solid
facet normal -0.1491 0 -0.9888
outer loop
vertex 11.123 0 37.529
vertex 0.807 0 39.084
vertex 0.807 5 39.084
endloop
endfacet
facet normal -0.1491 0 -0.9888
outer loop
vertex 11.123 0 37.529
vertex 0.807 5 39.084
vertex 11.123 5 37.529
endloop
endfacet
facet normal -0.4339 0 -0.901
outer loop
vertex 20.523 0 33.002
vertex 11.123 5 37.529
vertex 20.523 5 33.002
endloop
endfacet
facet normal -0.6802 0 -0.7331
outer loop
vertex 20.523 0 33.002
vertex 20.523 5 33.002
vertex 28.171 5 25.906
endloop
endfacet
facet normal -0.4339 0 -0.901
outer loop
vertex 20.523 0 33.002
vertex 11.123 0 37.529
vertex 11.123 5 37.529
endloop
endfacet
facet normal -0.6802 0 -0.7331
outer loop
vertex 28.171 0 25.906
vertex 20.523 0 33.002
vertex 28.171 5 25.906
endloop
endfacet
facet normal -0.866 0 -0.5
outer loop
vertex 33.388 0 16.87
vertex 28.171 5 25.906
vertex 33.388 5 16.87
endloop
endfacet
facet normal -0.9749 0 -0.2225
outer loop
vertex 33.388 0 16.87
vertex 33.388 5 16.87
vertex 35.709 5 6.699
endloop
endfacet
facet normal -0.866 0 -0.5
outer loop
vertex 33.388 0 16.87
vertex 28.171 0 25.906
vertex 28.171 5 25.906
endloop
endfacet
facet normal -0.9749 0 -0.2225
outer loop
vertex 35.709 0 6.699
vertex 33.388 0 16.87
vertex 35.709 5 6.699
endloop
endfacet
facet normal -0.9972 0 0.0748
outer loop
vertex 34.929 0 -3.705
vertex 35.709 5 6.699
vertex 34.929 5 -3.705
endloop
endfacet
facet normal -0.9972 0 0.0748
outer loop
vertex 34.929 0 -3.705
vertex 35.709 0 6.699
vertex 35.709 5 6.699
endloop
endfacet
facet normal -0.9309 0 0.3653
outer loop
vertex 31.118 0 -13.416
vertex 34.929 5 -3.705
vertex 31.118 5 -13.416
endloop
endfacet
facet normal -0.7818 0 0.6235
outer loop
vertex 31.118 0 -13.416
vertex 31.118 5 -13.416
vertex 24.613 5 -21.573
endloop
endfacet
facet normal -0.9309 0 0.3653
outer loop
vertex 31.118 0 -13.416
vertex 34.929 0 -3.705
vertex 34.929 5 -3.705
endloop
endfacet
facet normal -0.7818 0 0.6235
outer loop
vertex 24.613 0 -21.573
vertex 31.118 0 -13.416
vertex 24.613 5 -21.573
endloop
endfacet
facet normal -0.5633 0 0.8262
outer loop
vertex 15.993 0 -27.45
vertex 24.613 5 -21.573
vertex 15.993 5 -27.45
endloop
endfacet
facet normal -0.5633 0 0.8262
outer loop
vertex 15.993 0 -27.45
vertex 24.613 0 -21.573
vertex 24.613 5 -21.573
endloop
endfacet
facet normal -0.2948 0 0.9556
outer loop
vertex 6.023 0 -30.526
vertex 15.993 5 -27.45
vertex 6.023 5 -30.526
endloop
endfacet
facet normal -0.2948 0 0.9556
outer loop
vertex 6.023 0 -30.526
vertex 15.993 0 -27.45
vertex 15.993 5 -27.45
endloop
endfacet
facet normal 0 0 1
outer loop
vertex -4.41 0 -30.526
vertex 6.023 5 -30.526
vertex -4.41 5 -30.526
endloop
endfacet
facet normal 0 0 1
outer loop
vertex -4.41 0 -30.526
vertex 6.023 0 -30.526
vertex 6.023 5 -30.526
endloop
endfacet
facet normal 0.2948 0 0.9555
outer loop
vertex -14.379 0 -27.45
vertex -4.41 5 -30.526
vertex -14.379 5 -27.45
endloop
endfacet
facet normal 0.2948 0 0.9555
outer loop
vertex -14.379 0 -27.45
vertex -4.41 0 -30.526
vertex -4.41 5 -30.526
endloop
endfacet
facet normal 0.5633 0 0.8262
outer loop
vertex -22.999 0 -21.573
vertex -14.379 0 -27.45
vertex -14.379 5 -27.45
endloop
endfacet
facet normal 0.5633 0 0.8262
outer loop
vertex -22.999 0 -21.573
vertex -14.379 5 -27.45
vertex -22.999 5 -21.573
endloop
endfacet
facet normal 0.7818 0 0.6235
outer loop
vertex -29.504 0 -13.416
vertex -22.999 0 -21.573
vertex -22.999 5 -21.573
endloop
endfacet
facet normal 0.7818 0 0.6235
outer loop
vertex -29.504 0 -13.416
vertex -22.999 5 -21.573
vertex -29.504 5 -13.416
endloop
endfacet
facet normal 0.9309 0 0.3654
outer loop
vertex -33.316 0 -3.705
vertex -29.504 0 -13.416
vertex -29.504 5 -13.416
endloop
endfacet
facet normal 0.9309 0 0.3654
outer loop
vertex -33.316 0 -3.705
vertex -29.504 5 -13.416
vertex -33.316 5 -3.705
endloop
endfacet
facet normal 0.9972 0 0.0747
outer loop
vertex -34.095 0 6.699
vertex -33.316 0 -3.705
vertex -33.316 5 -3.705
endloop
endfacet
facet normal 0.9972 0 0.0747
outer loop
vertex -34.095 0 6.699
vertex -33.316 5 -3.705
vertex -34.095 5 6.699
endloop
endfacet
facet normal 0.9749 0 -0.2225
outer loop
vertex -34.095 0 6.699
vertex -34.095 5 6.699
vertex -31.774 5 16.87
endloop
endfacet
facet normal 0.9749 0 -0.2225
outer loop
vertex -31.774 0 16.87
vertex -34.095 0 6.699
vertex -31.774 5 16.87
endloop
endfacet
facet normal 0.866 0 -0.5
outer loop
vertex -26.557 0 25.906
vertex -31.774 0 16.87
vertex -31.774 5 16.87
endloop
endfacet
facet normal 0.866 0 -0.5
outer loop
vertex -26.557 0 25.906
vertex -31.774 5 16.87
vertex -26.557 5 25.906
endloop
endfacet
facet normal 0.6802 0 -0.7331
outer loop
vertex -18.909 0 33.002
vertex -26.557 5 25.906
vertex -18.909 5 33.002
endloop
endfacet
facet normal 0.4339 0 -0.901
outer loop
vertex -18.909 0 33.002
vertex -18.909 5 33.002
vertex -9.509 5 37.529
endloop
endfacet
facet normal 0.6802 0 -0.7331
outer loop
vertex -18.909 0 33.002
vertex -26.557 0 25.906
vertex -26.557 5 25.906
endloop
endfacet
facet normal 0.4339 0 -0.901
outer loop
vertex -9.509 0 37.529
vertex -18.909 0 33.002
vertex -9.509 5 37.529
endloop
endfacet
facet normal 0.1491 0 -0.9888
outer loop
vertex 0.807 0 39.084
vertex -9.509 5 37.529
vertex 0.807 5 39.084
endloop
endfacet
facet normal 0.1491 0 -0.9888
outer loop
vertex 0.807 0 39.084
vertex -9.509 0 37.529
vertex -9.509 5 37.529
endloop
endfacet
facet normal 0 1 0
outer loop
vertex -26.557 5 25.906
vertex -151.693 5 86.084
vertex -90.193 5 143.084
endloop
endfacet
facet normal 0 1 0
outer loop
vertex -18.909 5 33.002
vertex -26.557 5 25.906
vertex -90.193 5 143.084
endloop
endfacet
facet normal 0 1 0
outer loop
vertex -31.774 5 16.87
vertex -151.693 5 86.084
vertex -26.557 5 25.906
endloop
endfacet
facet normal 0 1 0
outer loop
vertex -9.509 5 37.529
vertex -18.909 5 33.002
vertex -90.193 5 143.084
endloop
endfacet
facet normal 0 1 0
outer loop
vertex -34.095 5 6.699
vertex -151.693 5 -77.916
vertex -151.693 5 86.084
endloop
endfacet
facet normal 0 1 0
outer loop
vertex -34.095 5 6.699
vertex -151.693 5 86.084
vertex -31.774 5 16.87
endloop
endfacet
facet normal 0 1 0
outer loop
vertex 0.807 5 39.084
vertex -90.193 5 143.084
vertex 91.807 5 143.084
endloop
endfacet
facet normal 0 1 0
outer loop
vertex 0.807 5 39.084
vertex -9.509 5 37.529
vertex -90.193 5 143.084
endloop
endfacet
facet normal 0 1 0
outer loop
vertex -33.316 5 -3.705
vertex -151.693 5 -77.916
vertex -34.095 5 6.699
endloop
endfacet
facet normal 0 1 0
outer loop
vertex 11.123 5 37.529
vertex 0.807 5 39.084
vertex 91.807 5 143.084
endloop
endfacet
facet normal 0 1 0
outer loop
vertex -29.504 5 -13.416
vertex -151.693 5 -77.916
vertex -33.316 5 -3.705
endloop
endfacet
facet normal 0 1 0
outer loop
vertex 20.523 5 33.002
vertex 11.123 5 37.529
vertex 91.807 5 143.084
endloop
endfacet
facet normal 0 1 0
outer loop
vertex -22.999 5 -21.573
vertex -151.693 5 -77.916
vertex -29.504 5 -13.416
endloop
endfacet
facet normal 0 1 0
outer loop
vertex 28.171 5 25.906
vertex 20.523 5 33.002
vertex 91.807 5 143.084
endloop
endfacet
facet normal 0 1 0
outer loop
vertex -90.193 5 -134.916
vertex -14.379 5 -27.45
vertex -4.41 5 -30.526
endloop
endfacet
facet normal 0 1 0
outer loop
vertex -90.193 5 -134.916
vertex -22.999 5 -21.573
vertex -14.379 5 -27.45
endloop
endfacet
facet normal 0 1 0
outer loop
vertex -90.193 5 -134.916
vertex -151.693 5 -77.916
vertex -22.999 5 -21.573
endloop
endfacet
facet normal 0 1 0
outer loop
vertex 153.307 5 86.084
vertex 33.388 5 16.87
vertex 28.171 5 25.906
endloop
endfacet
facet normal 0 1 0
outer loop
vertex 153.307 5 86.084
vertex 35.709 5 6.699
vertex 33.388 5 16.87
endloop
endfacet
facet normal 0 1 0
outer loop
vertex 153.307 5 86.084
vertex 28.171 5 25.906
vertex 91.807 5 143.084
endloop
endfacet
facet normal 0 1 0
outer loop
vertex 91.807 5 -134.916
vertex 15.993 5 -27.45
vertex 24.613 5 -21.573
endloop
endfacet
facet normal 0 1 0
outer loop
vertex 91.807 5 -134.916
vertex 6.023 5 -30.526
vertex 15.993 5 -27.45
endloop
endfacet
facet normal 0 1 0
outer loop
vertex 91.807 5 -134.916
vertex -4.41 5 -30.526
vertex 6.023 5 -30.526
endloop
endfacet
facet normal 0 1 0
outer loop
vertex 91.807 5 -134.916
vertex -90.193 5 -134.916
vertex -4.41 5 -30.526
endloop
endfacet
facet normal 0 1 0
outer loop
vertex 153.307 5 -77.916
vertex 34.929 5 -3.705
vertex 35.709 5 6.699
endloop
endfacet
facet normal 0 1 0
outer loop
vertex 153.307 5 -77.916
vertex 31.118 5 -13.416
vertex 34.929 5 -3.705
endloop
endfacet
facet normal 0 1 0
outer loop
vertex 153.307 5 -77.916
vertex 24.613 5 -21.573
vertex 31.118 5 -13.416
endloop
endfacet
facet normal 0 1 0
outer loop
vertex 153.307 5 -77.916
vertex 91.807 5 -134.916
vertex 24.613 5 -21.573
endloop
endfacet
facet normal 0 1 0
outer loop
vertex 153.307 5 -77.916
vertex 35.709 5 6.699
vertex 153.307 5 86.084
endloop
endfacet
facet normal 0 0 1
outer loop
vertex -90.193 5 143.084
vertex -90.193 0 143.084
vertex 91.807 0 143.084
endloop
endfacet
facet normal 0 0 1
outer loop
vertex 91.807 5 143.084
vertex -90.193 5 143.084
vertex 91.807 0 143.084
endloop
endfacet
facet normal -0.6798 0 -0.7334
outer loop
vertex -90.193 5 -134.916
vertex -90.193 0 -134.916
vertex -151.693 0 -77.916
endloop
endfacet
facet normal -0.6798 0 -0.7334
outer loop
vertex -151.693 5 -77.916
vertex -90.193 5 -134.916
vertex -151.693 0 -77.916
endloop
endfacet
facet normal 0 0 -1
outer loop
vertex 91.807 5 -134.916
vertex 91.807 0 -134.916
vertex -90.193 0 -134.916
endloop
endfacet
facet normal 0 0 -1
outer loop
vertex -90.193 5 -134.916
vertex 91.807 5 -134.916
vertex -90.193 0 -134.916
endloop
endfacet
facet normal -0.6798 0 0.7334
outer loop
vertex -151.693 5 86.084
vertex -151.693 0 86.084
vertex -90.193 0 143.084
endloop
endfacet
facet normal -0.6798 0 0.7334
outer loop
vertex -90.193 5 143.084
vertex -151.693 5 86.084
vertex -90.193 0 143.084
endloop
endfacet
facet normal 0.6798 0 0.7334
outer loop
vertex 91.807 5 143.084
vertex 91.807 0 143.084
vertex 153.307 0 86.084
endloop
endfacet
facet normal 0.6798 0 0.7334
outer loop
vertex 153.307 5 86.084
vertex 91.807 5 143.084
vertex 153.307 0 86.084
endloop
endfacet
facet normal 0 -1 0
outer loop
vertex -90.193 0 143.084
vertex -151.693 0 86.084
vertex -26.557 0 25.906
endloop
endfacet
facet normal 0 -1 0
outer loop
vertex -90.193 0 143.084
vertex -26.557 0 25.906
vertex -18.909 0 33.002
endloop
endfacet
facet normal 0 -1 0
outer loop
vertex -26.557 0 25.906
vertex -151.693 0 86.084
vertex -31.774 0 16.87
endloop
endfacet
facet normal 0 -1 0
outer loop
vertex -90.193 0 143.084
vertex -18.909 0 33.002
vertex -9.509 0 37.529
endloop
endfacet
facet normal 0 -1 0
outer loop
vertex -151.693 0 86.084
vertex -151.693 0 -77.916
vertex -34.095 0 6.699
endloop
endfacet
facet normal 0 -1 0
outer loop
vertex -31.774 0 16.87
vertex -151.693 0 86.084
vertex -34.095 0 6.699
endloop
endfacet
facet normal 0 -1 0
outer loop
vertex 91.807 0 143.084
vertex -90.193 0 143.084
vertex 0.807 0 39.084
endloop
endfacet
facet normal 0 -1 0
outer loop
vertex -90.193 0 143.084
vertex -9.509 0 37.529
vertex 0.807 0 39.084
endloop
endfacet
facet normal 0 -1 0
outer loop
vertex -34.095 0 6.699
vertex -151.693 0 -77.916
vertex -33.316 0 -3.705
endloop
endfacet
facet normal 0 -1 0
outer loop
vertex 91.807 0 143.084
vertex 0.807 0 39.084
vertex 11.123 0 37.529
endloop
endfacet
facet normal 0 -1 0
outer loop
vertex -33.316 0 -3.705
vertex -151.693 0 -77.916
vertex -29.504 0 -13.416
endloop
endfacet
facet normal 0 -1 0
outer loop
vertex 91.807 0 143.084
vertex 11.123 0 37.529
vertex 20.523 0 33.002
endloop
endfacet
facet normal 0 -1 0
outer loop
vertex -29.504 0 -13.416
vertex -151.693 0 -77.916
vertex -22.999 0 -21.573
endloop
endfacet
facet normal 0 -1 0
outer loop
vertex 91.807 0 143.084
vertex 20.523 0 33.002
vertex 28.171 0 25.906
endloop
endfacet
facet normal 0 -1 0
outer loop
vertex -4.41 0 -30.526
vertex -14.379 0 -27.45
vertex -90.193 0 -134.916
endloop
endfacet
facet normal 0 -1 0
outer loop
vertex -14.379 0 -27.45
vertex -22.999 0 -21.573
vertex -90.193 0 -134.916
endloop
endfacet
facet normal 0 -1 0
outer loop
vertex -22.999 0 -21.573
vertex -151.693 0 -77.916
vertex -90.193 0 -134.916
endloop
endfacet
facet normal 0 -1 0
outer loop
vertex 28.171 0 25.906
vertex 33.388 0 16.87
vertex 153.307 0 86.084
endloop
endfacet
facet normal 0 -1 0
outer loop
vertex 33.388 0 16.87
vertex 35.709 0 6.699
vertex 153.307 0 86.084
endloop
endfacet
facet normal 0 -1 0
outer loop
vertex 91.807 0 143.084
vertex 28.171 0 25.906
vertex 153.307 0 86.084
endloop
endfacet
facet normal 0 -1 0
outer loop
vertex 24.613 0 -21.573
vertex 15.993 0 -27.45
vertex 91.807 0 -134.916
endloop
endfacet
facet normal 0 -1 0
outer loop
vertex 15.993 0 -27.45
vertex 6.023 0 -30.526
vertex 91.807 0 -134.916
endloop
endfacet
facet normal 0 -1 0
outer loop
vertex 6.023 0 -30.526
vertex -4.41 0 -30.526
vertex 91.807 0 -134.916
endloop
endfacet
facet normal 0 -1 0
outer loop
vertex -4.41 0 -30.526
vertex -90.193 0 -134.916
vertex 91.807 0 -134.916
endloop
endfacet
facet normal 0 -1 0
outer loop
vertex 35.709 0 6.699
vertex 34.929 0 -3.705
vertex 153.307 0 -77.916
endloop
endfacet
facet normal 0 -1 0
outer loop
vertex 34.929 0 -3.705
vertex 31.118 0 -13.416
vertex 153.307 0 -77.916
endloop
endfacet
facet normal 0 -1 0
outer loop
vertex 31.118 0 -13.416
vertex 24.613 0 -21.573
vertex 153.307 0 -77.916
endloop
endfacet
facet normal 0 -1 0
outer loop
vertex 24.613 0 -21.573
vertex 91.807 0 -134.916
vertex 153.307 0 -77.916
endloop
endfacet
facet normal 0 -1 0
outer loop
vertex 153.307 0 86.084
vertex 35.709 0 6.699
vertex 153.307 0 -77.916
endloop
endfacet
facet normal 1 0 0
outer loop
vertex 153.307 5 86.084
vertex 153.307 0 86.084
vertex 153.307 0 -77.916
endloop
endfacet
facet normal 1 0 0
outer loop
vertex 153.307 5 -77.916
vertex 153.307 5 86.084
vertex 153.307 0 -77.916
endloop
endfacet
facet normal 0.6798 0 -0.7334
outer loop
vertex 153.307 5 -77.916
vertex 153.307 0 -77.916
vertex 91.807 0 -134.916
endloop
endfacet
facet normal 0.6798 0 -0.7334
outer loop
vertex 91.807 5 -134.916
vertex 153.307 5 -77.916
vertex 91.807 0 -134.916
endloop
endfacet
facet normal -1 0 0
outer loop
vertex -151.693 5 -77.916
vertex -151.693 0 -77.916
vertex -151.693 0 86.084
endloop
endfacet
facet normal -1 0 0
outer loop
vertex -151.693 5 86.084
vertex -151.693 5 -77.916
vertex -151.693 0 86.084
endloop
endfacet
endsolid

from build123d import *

# Parameters (mm, degrees)
SKETCH_1_R      = 35
EXTRUDE_1_DEPTH = 5


with BuildPart() as part:
    # Эскиз1 → Вытянуть1 (new body)
    with BuildSketch(Plane(origin=(0, 0, 0), x_dir=(1, 0, 0), z_dir=(0, 1, 0))):
        Polygon((-151.693051502, 77.916478726), (-151.693051502, -86.083521274), (-90.193051502, -143.083521274), (91.806948498, -143.083521274), (153.306948498, -86.083521274), (153.306948498, 77.916478726), (91.806948498, 134.916478726), (-90.193051502, 134.916478726), align=None)
        with Locations(Location((0.806948498, -4.083521274, 0), (0, 0, 270))):
            Circle(SKETCH_1_R, mode=Mode.SUBTRACT)
    extrude(amount=EXTRUDE_1_DEPTH)


solid = part.part
